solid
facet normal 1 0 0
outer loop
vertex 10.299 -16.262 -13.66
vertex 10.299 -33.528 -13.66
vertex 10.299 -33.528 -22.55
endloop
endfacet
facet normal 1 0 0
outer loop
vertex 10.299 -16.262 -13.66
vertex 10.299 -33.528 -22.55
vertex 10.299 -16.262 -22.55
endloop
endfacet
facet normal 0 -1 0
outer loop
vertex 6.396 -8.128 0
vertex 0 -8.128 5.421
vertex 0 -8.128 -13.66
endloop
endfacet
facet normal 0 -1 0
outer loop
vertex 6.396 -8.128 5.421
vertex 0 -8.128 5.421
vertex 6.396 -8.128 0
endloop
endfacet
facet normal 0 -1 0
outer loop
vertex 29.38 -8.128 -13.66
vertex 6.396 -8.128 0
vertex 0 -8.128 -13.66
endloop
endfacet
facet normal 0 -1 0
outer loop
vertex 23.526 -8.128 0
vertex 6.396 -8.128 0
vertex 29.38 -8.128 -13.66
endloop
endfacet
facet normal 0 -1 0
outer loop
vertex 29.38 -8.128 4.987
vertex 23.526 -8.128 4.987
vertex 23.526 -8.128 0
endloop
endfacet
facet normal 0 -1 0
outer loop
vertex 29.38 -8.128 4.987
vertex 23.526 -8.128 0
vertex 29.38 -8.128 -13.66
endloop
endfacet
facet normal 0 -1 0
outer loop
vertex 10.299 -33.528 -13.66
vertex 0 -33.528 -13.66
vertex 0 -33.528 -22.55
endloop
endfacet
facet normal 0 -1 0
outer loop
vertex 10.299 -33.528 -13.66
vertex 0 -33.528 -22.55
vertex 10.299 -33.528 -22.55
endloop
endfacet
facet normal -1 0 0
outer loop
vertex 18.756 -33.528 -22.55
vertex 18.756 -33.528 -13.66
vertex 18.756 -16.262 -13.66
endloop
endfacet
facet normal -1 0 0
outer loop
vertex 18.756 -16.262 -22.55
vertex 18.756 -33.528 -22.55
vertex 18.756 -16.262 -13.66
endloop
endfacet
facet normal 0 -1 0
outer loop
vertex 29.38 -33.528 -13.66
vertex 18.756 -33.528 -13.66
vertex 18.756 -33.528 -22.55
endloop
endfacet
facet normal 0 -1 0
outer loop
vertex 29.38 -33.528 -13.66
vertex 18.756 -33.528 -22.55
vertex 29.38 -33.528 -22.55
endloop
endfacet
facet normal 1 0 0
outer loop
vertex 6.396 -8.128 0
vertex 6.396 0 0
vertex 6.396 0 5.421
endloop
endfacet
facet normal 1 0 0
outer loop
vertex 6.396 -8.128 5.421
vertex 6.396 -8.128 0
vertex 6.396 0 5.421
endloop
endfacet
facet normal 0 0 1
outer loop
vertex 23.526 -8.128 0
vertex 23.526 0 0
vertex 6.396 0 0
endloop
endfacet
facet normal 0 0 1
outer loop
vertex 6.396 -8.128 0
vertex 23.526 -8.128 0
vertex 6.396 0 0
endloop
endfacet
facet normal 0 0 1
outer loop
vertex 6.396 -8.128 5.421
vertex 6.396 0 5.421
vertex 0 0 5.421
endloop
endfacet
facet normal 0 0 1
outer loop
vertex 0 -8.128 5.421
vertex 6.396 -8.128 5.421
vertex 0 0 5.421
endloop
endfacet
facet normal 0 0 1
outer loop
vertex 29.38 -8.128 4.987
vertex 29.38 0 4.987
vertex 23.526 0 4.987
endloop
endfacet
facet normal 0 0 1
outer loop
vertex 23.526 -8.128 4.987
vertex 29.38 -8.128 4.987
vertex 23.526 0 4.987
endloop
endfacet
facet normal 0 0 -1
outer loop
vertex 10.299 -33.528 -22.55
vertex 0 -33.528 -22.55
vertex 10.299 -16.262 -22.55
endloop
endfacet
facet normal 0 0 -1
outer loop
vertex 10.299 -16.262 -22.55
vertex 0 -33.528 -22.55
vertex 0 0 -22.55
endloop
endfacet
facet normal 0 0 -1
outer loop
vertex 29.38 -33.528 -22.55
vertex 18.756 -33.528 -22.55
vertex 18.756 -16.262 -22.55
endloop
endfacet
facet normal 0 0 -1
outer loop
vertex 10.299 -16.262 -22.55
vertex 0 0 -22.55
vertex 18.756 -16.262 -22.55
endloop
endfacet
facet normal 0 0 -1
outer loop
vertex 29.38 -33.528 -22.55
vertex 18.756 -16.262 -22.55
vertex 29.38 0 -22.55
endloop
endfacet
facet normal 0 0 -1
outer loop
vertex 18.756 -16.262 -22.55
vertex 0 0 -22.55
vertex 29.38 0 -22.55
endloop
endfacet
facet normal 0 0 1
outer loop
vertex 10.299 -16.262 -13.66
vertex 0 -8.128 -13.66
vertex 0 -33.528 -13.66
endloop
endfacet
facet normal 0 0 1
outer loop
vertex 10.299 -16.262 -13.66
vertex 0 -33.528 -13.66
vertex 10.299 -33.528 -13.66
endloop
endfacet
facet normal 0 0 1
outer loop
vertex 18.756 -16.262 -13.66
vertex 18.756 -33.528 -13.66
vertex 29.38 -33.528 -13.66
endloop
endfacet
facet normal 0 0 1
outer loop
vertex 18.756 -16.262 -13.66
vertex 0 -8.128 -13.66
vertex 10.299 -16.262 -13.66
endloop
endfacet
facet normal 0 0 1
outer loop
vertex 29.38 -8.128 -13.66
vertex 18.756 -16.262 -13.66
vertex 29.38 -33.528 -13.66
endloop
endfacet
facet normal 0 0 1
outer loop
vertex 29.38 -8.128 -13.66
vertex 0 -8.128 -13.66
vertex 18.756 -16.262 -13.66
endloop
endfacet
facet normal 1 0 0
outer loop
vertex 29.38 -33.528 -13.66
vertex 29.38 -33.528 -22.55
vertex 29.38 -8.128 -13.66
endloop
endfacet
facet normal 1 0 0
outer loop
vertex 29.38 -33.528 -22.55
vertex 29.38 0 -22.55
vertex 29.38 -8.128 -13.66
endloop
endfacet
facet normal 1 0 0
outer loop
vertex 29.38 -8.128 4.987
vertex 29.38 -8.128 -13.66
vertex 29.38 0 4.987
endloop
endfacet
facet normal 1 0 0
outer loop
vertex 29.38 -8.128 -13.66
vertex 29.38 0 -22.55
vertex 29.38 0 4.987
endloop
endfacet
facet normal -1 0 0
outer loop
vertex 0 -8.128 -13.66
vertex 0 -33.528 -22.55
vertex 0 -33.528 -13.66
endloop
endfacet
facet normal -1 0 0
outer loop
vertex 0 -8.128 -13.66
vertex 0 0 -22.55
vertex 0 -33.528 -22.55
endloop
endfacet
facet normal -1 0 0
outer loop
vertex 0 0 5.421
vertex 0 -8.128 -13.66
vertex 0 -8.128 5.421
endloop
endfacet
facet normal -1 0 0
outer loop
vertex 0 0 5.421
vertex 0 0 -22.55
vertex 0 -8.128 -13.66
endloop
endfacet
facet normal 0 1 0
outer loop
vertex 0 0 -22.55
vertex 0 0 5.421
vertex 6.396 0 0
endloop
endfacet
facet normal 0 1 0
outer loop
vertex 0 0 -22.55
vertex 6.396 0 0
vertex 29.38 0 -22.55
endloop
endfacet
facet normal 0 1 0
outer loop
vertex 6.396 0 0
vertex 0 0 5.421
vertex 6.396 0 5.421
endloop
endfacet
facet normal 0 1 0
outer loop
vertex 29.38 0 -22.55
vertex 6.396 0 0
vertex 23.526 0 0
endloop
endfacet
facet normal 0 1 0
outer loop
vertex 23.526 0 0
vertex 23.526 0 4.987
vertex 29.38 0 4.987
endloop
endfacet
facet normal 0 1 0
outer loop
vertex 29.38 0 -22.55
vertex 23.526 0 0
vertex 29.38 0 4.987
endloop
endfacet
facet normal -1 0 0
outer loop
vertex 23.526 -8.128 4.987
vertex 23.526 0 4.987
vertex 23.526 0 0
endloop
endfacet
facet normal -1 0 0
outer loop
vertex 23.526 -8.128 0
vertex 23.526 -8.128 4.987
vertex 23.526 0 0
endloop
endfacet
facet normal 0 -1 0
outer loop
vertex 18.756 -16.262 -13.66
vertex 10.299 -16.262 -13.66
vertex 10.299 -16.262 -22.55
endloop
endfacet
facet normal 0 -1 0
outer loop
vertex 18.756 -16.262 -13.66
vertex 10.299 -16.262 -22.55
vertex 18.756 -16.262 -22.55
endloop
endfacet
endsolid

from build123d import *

# Parameters (mm, degrees)
F1_DEPTH = 8.128
F2_W     = 29.380368
F2_H     = 8.890002
F3_DEPTH = 25.4
F4_W     = 6.938537
F4_H     = 17.482635
F5_DEPTH = 8.382
F6_W     = 8.456341
F6_H     = 17.265804
F7_DEPTH = 9.906


with BuildPart() as f1:
    # F0 (on Front) → F1 (new body)
    with BuildSketch(Plane.XZ):
        Polygon((0, 5.420732), (0, 0), (0, -22.550246), (29.380368, -22.550246), (29.380368, 4.987073), (23.525976, 4.987073), (23.525976, 0), (6.396465, 0), (6.396465, 5.420732), align=None)
    extrude(amount=F1_DEPTH)

    # F2 (on face) → F3 (join)
    with BuildSketch(Plane.XZ.offset(8.128)):
        with Locations((14.690184, -18.105245)):
            Rectangle(F2_W, F2_H)
    extrude(amount=F3_DEPTH)

    # F4 (on face) → F5 (join)
    with BuildSketch(Plane.XY.offset(-13.660244)):
        with Locations((15.286463, -24.786682)):
            Rectangle(F4_W, F4_H)
    extrude(amount=-F5_DEPTH)

    # F6 (on face) → F7 (cut)
    with BuildSketch(Plane.XY.offset(-13.660244)):
        with Locations((14.527561, -24.895098)):
            Rectangle(F6_W, F6_H)
    extrude(amount=-F7_DEPTH, mode=Mode.SUBTRACT)


solid = f1.part
